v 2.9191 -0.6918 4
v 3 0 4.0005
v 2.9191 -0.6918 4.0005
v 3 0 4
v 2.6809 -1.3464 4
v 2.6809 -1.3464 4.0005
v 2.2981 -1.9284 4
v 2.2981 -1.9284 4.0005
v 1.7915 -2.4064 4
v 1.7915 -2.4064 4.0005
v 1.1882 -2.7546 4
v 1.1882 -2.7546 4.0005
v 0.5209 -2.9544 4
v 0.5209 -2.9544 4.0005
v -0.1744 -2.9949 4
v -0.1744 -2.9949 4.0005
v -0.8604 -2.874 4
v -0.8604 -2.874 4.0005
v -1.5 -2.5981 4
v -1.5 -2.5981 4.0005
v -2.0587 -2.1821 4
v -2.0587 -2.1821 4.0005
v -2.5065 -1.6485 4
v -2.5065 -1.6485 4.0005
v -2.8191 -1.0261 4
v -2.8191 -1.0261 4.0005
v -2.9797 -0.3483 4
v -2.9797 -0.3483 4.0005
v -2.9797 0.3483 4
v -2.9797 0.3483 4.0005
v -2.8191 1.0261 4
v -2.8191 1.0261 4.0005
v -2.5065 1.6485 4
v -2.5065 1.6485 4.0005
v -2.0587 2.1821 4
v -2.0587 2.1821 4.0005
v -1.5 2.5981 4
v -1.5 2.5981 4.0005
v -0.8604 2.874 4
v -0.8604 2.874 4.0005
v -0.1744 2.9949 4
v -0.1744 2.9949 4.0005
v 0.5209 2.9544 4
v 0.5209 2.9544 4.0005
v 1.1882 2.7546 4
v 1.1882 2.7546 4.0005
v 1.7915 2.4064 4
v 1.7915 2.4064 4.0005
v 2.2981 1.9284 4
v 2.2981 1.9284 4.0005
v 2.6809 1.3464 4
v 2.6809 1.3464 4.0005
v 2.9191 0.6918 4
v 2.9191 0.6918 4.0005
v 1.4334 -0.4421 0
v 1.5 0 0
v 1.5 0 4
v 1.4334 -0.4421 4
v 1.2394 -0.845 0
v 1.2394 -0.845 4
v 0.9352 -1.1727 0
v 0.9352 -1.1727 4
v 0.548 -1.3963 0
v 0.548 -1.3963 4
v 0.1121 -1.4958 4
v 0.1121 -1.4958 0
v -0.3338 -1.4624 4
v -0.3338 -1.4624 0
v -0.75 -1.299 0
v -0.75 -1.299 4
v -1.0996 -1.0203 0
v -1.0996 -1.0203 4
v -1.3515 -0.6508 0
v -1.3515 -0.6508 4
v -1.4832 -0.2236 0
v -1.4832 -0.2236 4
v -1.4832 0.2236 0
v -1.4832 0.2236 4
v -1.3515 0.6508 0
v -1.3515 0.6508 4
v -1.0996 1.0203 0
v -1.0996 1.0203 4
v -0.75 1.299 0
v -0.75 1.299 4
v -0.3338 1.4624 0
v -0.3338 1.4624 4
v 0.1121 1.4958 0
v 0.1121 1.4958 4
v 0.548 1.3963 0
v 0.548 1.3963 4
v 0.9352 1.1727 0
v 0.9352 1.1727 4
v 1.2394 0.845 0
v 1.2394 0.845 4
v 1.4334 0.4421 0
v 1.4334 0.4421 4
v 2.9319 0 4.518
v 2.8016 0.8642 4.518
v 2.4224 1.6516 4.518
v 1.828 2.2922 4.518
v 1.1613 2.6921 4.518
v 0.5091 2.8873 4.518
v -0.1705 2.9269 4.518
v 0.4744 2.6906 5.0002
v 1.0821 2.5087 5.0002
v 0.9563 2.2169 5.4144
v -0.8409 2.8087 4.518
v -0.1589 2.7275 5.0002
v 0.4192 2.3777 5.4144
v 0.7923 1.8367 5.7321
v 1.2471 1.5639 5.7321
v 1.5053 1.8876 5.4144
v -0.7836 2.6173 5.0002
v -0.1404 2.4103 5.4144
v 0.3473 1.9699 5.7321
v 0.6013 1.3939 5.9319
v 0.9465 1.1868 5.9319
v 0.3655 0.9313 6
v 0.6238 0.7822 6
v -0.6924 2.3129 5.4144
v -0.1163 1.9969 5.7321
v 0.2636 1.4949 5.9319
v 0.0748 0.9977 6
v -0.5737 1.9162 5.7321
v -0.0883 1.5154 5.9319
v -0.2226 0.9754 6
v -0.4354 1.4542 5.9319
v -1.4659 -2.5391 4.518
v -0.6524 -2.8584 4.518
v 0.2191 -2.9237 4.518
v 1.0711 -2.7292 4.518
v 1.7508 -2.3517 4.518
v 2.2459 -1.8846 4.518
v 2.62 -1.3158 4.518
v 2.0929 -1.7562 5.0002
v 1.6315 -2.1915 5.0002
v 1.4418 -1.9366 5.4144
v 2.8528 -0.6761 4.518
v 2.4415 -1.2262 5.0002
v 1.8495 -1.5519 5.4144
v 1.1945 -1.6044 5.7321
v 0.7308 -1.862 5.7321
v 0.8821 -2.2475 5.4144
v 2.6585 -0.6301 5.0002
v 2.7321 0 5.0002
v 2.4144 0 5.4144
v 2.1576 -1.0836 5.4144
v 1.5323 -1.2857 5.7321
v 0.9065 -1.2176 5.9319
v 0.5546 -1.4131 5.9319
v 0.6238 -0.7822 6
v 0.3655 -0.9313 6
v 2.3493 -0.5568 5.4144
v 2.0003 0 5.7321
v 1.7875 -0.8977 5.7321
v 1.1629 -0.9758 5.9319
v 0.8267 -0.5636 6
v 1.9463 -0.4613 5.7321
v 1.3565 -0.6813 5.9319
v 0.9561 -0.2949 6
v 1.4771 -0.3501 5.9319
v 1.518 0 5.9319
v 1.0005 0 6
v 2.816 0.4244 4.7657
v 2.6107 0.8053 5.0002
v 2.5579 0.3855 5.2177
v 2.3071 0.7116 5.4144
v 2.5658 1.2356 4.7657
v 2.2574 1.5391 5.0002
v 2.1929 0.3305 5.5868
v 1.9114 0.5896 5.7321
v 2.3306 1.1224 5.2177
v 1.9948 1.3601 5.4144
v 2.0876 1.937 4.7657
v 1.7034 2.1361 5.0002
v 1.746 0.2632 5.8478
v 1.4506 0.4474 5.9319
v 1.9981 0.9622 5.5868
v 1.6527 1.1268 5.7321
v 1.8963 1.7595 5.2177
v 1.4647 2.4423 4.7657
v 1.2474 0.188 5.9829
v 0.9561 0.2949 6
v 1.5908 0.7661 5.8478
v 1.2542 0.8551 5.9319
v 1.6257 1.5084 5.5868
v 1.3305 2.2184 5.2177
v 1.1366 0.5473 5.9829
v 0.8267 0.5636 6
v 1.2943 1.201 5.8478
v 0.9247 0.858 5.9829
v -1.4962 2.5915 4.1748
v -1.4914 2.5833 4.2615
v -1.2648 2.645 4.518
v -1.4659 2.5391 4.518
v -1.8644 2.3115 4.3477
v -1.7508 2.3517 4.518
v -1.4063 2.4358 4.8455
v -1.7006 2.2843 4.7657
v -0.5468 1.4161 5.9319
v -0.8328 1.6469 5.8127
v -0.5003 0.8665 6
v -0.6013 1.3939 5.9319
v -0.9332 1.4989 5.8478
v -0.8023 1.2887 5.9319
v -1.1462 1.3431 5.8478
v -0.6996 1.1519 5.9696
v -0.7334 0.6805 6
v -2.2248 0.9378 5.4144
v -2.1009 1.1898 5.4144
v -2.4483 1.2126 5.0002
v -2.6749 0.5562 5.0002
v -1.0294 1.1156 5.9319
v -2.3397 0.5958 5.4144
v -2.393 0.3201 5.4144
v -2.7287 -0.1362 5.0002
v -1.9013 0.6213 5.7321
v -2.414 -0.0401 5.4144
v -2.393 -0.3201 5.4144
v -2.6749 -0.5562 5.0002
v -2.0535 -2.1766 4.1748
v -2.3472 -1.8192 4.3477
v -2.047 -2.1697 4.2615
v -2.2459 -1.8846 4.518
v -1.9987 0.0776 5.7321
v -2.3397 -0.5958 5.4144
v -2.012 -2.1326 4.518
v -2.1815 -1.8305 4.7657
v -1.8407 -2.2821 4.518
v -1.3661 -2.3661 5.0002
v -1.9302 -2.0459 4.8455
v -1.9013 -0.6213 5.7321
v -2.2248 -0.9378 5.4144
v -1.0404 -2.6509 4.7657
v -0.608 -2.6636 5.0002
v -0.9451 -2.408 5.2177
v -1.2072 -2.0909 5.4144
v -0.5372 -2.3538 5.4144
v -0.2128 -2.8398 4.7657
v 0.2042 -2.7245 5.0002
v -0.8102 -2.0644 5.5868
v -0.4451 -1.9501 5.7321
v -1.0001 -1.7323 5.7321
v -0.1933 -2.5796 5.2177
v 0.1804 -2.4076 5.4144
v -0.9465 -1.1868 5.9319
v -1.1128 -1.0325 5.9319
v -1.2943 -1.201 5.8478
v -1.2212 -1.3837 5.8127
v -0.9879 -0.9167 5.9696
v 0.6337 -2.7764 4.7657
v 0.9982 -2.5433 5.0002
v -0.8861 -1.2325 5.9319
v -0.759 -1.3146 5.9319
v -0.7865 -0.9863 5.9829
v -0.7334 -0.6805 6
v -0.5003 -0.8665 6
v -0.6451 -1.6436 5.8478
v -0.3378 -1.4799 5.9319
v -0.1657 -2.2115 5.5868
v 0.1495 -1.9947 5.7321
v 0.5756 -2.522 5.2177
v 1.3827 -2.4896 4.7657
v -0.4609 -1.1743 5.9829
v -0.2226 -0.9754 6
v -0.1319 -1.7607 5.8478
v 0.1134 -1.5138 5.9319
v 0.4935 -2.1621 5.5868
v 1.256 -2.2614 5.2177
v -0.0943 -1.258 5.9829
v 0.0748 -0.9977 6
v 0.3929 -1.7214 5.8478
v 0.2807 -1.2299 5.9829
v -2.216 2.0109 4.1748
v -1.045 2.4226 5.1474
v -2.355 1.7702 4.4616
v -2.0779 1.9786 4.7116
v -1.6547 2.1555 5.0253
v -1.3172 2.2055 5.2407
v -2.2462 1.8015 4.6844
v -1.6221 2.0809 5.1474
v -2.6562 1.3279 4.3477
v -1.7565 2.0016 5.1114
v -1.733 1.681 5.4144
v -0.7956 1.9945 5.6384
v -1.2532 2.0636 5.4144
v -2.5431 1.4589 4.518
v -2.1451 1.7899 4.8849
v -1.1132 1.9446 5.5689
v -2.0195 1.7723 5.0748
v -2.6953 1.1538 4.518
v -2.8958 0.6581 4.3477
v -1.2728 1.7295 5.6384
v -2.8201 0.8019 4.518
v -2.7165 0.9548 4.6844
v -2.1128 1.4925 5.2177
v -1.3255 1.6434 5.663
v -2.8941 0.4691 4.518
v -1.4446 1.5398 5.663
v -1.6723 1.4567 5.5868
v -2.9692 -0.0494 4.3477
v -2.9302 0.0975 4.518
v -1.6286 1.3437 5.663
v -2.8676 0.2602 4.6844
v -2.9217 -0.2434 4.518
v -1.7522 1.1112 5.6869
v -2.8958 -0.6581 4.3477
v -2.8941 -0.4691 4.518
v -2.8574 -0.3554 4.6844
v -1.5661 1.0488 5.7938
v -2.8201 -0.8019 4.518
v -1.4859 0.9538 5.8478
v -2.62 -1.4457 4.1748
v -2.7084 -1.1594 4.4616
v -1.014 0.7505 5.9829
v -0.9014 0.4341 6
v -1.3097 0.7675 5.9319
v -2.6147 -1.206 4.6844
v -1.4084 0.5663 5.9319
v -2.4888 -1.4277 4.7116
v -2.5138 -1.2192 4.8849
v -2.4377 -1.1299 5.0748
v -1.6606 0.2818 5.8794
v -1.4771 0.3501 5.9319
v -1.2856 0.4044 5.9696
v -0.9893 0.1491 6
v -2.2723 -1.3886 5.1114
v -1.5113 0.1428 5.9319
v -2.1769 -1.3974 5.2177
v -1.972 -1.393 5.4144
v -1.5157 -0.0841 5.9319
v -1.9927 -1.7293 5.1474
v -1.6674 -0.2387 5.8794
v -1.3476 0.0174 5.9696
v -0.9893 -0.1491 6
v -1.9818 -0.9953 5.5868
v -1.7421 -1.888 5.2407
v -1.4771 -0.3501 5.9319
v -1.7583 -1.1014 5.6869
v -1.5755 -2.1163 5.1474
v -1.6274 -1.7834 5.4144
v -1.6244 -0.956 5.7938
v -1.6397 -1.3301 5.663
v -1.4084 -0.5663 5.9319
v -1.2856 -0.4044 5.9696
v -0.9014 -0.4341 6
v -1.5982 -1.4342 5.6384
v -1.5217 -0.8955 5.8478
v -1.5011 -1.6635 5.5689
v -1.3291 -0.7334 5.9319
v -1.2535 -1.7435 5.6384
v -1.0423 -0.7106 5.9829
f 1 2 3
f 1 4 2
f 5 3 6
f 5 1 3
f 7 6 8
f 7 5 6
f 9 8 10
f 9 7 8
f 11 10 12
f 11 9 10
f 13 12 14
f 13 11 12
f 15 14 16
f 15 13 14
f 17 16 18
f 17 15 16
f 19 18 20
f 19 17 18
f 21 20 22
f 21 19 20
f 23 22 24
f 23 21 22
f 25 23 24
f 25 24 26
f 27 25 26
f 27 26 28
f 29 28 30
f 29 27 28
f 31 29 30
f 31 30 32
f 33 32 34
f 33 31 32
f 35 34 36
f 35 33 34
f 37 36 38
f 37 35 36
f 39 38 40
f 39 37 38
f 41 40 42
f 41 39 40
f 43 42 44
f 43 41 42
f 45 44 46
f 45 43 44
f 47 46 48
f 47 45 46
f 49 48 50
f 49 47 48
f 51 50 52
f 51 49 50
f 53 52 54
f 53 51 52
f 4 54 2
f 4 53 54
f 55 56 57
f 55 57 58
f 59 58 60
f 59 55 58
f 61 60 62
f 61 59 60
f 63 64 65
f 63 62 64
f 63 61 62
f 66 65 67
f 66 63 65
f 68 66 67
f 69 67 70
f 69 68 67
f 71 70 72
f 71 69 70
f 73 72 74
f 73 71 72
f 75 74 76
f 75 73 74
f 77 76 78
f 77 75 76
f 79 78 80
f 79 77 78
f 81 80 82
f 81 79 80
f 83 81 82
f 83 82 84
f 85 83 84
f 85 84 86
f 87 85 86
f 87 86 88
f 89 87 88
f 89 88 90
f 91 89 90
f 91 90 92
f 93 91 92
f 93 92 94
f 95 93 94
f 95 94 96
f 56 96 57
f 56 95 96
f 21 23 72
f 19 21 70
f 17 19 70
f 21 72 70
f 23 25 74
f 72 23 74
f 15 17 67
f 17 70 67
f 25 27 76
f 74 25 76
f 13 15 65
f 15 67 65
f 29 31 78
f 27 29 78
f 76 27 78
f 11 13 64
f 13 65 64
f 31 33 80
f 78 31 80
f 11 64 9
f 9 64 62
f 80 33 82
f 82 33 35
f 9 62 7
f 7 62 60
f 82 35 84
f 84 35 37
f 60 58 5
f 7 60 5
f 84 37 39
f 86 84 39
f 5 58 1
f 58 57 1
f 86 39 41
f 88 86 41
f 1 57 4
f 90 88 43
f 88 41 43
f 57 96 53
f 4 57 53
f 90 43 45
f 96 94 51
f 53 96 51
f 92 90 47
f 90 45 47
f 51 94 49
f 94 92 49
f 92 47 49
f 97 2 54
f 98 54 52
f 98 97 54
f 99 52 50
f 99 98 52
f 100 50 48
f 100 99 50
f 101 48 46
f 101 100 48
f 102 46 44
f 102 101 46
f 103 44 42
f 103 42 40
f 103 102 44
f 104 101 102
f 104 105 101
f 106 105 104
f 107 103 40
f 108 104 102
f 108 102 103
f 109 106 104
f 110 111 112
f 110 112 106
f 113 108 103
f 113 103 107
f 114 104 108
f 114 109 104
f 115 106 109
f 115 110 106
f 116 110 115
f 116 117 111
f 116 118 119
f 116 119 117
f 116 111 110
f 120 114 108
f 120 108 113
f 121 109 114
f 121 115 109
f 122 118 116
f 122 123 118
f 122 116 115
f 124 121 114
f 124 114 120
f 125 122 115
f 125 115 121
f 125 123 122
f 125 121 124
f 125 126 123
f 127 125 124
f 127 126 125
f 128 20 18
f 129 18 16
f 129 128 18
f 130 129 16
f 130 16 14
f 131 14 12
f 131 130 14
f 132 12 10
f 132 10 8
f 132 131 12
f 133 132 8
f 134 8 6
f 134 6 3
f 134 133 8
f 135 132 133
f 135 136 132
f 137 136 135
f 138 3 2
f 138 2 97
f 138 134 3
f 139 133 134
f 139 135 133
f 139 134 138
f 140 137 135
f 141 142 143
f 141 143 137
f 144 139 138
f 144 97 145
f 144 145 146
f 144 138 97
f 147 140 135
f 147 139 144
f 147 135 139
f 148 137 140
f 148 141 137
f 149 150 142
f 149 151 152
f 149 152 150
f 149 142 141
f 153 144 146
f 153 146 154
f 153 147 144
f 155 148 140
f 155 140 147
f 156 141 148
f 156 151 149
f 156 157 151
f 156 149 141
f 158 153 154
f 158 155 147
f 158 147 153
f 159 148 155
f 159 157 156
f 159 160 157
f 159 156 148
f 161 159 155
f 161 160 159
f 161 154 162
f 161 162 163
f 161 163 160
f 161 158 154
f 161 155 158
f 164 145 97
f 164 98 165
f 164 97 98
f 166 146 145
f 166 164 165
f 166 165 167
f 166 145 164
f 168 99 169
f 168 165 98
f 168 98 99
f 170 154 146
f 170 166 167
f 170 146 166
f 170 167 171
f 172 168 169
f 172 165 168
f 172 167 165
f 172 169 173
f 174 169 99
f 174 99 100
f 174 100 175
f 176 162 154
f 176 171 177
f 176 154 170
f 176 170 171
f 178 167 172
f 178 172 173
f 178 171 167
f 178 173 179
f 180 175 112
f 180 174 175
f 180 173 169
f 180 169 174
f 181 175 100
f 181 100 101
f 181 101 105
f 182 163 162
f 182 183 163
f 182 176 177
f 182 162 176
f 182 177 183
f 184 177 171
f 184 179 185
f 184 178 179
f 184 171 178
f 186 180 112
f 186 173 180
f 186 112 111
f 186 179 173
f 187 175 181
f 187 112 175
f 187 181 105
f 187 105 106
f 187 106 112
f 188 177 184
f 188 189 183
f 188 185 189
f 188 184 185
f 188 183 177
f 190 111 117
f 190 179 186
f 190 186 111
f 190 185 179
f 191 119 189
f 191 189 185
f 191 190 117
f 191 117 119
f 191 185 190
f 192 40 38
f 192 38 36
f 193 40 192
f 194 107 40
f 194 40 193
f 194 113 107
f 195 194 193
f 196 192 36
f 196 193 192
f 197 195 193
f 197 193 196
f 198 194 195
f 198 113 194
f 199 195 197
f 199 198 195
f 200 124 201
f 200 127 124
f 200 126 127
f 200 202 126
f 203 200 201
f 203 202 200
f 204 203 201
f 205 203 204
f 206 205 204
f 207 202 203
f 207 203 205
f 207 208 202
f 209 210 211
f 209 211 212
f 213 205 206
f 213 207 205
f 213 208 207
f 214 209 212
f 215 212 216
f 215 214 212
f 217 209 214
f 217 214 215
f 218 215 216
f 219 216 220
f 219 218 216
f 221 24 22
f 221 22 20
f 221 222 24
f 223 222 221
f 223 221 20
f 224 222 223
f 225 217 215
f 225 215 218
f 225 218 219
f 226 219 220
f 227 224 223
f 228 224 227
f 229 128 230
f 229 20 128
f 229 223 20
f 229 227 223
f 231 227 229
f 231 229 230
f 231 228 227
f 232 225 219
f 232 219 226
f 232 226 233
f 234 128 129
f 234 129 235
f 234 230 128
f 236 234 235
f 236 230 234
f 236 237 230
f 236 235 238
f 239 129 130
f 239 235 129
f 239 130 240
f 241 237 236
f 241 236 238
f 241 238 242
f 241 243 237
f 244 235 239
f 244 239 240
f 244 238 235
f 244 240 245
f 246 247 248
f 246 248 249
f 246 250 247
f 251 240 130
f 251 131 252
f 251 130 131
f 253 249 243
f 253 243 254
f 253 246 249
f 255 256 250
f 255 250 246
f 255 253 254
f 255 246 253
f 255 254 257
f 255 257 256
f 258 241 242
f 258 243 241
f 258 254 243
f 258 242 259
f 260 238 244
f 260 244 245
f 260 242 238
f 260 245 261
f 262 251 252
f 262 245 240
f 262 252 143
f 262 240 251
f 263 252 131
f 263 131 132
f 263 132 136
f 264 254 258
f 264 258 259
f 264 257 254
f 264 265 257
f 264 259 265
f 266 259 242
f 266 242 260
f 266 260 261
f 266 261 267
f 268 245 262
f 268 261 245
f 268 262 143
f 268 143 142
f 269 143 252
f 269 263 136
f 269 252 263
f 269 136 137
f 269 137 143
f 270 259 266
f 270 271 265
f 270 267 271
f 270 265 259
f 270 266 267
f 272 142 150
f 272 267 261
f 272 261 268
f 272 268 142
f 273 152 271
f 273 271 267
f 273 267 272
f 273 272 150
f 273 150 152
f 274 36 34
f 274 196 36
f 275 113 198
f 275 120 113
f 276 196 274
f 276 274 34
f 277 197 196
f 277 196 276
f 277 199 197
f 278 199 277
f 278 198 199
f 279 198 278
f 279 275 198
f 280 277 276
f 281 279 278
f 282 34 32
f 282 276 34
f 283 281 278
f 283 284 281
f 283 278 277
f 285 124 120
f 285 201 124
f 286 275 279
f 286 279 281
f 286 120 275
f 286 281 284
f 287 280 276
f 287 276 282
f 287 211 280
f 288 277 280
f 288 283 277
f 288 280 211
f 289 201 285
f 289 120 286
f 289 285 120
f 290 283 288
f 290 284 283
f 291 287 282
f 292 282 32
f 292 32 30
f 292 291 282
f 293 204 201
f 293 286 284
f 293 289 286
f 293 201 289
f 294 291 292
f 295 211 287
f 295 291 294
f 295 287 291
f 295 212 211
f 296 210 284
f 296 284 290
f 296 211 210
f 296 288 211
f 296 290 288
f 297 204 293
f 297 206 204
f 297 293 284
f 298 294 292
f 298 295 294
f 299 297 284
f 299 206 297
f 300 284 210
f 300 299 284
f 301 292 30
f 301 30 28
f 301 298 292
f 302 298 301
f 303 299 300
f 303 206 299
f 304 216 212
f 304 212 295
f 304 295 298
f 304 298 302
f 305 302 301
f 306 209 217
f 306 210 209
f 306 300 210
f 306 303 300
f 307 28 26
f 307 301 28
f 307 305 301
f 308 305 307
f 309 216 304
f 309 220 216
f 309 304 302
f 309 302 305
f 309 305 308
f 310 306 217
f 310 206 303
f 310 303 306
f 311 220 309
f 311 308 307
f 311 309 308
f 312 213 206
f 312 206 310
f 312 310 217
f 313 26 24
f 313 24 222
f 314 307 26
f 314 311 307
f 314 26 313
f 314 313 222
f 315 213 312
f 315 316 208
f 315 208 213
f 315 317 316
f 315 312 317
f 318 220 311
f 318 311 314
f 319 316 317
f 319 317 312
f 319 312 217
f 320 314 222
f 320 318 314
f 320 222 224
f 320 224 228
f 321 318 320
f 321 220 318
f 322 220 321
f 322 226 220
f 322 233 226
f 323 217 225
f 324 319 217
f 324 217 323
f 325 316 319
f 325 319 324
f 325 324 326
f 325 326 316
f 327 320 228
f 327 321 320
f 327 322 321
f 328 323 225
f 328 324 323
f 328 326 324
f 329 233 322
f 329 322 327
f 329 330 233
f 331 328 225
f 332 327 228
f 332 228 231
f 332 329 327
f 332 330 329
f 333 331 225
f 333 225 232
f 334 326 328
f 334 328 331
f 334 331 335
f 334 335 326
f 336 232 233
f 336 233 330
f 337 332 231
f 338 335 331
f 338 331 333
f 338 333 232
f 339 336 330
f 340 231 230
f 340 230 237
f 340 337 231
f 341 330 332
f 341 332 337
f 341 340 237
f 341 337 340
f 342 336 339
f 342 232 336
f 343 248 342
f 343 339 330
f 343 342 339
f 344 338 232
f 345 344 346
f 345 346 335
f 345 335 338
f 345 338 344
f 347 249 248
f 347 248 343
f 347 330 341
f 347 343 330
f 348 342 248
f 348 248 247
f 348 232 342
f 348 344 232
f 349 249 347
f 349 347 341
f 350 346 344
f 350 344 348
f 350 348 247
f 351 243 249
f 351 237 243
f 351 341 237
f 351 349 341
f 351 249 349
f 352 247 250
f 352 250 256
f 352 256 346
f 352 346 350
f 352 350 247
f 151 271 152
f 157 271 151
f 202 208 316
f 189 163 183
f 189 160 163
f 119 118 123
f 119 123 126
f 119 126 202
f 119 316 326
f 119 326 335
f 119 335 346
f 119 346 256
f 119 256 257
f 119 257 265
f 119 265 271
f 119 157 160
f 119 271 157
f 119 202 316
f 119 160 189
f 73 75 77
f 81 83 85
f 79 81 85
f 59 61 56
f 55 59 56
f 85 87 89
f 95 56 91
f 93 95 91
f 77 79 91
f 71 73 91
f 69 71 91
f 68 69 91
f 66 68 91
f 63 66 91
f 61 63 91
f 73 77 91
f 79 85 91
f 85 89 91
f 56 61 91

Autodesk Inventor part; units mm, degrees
ref_plane "YZ Plane" through (0, 0, 0) normal (1, 0, 0) x (0, 1, 0)
ref_plane "XZ Plane" through (0, 0, 0) normal (0, 1, 0) x (-1, 0, 0)
ref_plane "XY Plane" through (0, 0, 0) normal (0, 0, 1) x (1, 0, 0)
sketch "スケッチ1" plane through (0, 0, 0) normal (0, 0, 1) x (1, 0, 0)
  circle A0 centre (0, 0) radius 1.5
  dimension "d0" = 3
extrude "押し出し1" add sketch "スケッチ1" along normal blind 4
sketch "スケッチ2" plane through (0, 0, 4) normal (0, 0, 1) x (1, 0, 0)
  circle A0 centre (0, 0) radius 1.5 projected
  circle A1 centre (0, 0) radius 3
  dimension "d3" = 6
extrude "押し出し2" add sketch "スケッチ2" along normal blind 2 contours A0 | A1
fillet "フィレット1" radius 2 1 edges at (-3, 0, 6)
properties part number "M3ボタンボルト4" material "鋼、高強度、低合金"
